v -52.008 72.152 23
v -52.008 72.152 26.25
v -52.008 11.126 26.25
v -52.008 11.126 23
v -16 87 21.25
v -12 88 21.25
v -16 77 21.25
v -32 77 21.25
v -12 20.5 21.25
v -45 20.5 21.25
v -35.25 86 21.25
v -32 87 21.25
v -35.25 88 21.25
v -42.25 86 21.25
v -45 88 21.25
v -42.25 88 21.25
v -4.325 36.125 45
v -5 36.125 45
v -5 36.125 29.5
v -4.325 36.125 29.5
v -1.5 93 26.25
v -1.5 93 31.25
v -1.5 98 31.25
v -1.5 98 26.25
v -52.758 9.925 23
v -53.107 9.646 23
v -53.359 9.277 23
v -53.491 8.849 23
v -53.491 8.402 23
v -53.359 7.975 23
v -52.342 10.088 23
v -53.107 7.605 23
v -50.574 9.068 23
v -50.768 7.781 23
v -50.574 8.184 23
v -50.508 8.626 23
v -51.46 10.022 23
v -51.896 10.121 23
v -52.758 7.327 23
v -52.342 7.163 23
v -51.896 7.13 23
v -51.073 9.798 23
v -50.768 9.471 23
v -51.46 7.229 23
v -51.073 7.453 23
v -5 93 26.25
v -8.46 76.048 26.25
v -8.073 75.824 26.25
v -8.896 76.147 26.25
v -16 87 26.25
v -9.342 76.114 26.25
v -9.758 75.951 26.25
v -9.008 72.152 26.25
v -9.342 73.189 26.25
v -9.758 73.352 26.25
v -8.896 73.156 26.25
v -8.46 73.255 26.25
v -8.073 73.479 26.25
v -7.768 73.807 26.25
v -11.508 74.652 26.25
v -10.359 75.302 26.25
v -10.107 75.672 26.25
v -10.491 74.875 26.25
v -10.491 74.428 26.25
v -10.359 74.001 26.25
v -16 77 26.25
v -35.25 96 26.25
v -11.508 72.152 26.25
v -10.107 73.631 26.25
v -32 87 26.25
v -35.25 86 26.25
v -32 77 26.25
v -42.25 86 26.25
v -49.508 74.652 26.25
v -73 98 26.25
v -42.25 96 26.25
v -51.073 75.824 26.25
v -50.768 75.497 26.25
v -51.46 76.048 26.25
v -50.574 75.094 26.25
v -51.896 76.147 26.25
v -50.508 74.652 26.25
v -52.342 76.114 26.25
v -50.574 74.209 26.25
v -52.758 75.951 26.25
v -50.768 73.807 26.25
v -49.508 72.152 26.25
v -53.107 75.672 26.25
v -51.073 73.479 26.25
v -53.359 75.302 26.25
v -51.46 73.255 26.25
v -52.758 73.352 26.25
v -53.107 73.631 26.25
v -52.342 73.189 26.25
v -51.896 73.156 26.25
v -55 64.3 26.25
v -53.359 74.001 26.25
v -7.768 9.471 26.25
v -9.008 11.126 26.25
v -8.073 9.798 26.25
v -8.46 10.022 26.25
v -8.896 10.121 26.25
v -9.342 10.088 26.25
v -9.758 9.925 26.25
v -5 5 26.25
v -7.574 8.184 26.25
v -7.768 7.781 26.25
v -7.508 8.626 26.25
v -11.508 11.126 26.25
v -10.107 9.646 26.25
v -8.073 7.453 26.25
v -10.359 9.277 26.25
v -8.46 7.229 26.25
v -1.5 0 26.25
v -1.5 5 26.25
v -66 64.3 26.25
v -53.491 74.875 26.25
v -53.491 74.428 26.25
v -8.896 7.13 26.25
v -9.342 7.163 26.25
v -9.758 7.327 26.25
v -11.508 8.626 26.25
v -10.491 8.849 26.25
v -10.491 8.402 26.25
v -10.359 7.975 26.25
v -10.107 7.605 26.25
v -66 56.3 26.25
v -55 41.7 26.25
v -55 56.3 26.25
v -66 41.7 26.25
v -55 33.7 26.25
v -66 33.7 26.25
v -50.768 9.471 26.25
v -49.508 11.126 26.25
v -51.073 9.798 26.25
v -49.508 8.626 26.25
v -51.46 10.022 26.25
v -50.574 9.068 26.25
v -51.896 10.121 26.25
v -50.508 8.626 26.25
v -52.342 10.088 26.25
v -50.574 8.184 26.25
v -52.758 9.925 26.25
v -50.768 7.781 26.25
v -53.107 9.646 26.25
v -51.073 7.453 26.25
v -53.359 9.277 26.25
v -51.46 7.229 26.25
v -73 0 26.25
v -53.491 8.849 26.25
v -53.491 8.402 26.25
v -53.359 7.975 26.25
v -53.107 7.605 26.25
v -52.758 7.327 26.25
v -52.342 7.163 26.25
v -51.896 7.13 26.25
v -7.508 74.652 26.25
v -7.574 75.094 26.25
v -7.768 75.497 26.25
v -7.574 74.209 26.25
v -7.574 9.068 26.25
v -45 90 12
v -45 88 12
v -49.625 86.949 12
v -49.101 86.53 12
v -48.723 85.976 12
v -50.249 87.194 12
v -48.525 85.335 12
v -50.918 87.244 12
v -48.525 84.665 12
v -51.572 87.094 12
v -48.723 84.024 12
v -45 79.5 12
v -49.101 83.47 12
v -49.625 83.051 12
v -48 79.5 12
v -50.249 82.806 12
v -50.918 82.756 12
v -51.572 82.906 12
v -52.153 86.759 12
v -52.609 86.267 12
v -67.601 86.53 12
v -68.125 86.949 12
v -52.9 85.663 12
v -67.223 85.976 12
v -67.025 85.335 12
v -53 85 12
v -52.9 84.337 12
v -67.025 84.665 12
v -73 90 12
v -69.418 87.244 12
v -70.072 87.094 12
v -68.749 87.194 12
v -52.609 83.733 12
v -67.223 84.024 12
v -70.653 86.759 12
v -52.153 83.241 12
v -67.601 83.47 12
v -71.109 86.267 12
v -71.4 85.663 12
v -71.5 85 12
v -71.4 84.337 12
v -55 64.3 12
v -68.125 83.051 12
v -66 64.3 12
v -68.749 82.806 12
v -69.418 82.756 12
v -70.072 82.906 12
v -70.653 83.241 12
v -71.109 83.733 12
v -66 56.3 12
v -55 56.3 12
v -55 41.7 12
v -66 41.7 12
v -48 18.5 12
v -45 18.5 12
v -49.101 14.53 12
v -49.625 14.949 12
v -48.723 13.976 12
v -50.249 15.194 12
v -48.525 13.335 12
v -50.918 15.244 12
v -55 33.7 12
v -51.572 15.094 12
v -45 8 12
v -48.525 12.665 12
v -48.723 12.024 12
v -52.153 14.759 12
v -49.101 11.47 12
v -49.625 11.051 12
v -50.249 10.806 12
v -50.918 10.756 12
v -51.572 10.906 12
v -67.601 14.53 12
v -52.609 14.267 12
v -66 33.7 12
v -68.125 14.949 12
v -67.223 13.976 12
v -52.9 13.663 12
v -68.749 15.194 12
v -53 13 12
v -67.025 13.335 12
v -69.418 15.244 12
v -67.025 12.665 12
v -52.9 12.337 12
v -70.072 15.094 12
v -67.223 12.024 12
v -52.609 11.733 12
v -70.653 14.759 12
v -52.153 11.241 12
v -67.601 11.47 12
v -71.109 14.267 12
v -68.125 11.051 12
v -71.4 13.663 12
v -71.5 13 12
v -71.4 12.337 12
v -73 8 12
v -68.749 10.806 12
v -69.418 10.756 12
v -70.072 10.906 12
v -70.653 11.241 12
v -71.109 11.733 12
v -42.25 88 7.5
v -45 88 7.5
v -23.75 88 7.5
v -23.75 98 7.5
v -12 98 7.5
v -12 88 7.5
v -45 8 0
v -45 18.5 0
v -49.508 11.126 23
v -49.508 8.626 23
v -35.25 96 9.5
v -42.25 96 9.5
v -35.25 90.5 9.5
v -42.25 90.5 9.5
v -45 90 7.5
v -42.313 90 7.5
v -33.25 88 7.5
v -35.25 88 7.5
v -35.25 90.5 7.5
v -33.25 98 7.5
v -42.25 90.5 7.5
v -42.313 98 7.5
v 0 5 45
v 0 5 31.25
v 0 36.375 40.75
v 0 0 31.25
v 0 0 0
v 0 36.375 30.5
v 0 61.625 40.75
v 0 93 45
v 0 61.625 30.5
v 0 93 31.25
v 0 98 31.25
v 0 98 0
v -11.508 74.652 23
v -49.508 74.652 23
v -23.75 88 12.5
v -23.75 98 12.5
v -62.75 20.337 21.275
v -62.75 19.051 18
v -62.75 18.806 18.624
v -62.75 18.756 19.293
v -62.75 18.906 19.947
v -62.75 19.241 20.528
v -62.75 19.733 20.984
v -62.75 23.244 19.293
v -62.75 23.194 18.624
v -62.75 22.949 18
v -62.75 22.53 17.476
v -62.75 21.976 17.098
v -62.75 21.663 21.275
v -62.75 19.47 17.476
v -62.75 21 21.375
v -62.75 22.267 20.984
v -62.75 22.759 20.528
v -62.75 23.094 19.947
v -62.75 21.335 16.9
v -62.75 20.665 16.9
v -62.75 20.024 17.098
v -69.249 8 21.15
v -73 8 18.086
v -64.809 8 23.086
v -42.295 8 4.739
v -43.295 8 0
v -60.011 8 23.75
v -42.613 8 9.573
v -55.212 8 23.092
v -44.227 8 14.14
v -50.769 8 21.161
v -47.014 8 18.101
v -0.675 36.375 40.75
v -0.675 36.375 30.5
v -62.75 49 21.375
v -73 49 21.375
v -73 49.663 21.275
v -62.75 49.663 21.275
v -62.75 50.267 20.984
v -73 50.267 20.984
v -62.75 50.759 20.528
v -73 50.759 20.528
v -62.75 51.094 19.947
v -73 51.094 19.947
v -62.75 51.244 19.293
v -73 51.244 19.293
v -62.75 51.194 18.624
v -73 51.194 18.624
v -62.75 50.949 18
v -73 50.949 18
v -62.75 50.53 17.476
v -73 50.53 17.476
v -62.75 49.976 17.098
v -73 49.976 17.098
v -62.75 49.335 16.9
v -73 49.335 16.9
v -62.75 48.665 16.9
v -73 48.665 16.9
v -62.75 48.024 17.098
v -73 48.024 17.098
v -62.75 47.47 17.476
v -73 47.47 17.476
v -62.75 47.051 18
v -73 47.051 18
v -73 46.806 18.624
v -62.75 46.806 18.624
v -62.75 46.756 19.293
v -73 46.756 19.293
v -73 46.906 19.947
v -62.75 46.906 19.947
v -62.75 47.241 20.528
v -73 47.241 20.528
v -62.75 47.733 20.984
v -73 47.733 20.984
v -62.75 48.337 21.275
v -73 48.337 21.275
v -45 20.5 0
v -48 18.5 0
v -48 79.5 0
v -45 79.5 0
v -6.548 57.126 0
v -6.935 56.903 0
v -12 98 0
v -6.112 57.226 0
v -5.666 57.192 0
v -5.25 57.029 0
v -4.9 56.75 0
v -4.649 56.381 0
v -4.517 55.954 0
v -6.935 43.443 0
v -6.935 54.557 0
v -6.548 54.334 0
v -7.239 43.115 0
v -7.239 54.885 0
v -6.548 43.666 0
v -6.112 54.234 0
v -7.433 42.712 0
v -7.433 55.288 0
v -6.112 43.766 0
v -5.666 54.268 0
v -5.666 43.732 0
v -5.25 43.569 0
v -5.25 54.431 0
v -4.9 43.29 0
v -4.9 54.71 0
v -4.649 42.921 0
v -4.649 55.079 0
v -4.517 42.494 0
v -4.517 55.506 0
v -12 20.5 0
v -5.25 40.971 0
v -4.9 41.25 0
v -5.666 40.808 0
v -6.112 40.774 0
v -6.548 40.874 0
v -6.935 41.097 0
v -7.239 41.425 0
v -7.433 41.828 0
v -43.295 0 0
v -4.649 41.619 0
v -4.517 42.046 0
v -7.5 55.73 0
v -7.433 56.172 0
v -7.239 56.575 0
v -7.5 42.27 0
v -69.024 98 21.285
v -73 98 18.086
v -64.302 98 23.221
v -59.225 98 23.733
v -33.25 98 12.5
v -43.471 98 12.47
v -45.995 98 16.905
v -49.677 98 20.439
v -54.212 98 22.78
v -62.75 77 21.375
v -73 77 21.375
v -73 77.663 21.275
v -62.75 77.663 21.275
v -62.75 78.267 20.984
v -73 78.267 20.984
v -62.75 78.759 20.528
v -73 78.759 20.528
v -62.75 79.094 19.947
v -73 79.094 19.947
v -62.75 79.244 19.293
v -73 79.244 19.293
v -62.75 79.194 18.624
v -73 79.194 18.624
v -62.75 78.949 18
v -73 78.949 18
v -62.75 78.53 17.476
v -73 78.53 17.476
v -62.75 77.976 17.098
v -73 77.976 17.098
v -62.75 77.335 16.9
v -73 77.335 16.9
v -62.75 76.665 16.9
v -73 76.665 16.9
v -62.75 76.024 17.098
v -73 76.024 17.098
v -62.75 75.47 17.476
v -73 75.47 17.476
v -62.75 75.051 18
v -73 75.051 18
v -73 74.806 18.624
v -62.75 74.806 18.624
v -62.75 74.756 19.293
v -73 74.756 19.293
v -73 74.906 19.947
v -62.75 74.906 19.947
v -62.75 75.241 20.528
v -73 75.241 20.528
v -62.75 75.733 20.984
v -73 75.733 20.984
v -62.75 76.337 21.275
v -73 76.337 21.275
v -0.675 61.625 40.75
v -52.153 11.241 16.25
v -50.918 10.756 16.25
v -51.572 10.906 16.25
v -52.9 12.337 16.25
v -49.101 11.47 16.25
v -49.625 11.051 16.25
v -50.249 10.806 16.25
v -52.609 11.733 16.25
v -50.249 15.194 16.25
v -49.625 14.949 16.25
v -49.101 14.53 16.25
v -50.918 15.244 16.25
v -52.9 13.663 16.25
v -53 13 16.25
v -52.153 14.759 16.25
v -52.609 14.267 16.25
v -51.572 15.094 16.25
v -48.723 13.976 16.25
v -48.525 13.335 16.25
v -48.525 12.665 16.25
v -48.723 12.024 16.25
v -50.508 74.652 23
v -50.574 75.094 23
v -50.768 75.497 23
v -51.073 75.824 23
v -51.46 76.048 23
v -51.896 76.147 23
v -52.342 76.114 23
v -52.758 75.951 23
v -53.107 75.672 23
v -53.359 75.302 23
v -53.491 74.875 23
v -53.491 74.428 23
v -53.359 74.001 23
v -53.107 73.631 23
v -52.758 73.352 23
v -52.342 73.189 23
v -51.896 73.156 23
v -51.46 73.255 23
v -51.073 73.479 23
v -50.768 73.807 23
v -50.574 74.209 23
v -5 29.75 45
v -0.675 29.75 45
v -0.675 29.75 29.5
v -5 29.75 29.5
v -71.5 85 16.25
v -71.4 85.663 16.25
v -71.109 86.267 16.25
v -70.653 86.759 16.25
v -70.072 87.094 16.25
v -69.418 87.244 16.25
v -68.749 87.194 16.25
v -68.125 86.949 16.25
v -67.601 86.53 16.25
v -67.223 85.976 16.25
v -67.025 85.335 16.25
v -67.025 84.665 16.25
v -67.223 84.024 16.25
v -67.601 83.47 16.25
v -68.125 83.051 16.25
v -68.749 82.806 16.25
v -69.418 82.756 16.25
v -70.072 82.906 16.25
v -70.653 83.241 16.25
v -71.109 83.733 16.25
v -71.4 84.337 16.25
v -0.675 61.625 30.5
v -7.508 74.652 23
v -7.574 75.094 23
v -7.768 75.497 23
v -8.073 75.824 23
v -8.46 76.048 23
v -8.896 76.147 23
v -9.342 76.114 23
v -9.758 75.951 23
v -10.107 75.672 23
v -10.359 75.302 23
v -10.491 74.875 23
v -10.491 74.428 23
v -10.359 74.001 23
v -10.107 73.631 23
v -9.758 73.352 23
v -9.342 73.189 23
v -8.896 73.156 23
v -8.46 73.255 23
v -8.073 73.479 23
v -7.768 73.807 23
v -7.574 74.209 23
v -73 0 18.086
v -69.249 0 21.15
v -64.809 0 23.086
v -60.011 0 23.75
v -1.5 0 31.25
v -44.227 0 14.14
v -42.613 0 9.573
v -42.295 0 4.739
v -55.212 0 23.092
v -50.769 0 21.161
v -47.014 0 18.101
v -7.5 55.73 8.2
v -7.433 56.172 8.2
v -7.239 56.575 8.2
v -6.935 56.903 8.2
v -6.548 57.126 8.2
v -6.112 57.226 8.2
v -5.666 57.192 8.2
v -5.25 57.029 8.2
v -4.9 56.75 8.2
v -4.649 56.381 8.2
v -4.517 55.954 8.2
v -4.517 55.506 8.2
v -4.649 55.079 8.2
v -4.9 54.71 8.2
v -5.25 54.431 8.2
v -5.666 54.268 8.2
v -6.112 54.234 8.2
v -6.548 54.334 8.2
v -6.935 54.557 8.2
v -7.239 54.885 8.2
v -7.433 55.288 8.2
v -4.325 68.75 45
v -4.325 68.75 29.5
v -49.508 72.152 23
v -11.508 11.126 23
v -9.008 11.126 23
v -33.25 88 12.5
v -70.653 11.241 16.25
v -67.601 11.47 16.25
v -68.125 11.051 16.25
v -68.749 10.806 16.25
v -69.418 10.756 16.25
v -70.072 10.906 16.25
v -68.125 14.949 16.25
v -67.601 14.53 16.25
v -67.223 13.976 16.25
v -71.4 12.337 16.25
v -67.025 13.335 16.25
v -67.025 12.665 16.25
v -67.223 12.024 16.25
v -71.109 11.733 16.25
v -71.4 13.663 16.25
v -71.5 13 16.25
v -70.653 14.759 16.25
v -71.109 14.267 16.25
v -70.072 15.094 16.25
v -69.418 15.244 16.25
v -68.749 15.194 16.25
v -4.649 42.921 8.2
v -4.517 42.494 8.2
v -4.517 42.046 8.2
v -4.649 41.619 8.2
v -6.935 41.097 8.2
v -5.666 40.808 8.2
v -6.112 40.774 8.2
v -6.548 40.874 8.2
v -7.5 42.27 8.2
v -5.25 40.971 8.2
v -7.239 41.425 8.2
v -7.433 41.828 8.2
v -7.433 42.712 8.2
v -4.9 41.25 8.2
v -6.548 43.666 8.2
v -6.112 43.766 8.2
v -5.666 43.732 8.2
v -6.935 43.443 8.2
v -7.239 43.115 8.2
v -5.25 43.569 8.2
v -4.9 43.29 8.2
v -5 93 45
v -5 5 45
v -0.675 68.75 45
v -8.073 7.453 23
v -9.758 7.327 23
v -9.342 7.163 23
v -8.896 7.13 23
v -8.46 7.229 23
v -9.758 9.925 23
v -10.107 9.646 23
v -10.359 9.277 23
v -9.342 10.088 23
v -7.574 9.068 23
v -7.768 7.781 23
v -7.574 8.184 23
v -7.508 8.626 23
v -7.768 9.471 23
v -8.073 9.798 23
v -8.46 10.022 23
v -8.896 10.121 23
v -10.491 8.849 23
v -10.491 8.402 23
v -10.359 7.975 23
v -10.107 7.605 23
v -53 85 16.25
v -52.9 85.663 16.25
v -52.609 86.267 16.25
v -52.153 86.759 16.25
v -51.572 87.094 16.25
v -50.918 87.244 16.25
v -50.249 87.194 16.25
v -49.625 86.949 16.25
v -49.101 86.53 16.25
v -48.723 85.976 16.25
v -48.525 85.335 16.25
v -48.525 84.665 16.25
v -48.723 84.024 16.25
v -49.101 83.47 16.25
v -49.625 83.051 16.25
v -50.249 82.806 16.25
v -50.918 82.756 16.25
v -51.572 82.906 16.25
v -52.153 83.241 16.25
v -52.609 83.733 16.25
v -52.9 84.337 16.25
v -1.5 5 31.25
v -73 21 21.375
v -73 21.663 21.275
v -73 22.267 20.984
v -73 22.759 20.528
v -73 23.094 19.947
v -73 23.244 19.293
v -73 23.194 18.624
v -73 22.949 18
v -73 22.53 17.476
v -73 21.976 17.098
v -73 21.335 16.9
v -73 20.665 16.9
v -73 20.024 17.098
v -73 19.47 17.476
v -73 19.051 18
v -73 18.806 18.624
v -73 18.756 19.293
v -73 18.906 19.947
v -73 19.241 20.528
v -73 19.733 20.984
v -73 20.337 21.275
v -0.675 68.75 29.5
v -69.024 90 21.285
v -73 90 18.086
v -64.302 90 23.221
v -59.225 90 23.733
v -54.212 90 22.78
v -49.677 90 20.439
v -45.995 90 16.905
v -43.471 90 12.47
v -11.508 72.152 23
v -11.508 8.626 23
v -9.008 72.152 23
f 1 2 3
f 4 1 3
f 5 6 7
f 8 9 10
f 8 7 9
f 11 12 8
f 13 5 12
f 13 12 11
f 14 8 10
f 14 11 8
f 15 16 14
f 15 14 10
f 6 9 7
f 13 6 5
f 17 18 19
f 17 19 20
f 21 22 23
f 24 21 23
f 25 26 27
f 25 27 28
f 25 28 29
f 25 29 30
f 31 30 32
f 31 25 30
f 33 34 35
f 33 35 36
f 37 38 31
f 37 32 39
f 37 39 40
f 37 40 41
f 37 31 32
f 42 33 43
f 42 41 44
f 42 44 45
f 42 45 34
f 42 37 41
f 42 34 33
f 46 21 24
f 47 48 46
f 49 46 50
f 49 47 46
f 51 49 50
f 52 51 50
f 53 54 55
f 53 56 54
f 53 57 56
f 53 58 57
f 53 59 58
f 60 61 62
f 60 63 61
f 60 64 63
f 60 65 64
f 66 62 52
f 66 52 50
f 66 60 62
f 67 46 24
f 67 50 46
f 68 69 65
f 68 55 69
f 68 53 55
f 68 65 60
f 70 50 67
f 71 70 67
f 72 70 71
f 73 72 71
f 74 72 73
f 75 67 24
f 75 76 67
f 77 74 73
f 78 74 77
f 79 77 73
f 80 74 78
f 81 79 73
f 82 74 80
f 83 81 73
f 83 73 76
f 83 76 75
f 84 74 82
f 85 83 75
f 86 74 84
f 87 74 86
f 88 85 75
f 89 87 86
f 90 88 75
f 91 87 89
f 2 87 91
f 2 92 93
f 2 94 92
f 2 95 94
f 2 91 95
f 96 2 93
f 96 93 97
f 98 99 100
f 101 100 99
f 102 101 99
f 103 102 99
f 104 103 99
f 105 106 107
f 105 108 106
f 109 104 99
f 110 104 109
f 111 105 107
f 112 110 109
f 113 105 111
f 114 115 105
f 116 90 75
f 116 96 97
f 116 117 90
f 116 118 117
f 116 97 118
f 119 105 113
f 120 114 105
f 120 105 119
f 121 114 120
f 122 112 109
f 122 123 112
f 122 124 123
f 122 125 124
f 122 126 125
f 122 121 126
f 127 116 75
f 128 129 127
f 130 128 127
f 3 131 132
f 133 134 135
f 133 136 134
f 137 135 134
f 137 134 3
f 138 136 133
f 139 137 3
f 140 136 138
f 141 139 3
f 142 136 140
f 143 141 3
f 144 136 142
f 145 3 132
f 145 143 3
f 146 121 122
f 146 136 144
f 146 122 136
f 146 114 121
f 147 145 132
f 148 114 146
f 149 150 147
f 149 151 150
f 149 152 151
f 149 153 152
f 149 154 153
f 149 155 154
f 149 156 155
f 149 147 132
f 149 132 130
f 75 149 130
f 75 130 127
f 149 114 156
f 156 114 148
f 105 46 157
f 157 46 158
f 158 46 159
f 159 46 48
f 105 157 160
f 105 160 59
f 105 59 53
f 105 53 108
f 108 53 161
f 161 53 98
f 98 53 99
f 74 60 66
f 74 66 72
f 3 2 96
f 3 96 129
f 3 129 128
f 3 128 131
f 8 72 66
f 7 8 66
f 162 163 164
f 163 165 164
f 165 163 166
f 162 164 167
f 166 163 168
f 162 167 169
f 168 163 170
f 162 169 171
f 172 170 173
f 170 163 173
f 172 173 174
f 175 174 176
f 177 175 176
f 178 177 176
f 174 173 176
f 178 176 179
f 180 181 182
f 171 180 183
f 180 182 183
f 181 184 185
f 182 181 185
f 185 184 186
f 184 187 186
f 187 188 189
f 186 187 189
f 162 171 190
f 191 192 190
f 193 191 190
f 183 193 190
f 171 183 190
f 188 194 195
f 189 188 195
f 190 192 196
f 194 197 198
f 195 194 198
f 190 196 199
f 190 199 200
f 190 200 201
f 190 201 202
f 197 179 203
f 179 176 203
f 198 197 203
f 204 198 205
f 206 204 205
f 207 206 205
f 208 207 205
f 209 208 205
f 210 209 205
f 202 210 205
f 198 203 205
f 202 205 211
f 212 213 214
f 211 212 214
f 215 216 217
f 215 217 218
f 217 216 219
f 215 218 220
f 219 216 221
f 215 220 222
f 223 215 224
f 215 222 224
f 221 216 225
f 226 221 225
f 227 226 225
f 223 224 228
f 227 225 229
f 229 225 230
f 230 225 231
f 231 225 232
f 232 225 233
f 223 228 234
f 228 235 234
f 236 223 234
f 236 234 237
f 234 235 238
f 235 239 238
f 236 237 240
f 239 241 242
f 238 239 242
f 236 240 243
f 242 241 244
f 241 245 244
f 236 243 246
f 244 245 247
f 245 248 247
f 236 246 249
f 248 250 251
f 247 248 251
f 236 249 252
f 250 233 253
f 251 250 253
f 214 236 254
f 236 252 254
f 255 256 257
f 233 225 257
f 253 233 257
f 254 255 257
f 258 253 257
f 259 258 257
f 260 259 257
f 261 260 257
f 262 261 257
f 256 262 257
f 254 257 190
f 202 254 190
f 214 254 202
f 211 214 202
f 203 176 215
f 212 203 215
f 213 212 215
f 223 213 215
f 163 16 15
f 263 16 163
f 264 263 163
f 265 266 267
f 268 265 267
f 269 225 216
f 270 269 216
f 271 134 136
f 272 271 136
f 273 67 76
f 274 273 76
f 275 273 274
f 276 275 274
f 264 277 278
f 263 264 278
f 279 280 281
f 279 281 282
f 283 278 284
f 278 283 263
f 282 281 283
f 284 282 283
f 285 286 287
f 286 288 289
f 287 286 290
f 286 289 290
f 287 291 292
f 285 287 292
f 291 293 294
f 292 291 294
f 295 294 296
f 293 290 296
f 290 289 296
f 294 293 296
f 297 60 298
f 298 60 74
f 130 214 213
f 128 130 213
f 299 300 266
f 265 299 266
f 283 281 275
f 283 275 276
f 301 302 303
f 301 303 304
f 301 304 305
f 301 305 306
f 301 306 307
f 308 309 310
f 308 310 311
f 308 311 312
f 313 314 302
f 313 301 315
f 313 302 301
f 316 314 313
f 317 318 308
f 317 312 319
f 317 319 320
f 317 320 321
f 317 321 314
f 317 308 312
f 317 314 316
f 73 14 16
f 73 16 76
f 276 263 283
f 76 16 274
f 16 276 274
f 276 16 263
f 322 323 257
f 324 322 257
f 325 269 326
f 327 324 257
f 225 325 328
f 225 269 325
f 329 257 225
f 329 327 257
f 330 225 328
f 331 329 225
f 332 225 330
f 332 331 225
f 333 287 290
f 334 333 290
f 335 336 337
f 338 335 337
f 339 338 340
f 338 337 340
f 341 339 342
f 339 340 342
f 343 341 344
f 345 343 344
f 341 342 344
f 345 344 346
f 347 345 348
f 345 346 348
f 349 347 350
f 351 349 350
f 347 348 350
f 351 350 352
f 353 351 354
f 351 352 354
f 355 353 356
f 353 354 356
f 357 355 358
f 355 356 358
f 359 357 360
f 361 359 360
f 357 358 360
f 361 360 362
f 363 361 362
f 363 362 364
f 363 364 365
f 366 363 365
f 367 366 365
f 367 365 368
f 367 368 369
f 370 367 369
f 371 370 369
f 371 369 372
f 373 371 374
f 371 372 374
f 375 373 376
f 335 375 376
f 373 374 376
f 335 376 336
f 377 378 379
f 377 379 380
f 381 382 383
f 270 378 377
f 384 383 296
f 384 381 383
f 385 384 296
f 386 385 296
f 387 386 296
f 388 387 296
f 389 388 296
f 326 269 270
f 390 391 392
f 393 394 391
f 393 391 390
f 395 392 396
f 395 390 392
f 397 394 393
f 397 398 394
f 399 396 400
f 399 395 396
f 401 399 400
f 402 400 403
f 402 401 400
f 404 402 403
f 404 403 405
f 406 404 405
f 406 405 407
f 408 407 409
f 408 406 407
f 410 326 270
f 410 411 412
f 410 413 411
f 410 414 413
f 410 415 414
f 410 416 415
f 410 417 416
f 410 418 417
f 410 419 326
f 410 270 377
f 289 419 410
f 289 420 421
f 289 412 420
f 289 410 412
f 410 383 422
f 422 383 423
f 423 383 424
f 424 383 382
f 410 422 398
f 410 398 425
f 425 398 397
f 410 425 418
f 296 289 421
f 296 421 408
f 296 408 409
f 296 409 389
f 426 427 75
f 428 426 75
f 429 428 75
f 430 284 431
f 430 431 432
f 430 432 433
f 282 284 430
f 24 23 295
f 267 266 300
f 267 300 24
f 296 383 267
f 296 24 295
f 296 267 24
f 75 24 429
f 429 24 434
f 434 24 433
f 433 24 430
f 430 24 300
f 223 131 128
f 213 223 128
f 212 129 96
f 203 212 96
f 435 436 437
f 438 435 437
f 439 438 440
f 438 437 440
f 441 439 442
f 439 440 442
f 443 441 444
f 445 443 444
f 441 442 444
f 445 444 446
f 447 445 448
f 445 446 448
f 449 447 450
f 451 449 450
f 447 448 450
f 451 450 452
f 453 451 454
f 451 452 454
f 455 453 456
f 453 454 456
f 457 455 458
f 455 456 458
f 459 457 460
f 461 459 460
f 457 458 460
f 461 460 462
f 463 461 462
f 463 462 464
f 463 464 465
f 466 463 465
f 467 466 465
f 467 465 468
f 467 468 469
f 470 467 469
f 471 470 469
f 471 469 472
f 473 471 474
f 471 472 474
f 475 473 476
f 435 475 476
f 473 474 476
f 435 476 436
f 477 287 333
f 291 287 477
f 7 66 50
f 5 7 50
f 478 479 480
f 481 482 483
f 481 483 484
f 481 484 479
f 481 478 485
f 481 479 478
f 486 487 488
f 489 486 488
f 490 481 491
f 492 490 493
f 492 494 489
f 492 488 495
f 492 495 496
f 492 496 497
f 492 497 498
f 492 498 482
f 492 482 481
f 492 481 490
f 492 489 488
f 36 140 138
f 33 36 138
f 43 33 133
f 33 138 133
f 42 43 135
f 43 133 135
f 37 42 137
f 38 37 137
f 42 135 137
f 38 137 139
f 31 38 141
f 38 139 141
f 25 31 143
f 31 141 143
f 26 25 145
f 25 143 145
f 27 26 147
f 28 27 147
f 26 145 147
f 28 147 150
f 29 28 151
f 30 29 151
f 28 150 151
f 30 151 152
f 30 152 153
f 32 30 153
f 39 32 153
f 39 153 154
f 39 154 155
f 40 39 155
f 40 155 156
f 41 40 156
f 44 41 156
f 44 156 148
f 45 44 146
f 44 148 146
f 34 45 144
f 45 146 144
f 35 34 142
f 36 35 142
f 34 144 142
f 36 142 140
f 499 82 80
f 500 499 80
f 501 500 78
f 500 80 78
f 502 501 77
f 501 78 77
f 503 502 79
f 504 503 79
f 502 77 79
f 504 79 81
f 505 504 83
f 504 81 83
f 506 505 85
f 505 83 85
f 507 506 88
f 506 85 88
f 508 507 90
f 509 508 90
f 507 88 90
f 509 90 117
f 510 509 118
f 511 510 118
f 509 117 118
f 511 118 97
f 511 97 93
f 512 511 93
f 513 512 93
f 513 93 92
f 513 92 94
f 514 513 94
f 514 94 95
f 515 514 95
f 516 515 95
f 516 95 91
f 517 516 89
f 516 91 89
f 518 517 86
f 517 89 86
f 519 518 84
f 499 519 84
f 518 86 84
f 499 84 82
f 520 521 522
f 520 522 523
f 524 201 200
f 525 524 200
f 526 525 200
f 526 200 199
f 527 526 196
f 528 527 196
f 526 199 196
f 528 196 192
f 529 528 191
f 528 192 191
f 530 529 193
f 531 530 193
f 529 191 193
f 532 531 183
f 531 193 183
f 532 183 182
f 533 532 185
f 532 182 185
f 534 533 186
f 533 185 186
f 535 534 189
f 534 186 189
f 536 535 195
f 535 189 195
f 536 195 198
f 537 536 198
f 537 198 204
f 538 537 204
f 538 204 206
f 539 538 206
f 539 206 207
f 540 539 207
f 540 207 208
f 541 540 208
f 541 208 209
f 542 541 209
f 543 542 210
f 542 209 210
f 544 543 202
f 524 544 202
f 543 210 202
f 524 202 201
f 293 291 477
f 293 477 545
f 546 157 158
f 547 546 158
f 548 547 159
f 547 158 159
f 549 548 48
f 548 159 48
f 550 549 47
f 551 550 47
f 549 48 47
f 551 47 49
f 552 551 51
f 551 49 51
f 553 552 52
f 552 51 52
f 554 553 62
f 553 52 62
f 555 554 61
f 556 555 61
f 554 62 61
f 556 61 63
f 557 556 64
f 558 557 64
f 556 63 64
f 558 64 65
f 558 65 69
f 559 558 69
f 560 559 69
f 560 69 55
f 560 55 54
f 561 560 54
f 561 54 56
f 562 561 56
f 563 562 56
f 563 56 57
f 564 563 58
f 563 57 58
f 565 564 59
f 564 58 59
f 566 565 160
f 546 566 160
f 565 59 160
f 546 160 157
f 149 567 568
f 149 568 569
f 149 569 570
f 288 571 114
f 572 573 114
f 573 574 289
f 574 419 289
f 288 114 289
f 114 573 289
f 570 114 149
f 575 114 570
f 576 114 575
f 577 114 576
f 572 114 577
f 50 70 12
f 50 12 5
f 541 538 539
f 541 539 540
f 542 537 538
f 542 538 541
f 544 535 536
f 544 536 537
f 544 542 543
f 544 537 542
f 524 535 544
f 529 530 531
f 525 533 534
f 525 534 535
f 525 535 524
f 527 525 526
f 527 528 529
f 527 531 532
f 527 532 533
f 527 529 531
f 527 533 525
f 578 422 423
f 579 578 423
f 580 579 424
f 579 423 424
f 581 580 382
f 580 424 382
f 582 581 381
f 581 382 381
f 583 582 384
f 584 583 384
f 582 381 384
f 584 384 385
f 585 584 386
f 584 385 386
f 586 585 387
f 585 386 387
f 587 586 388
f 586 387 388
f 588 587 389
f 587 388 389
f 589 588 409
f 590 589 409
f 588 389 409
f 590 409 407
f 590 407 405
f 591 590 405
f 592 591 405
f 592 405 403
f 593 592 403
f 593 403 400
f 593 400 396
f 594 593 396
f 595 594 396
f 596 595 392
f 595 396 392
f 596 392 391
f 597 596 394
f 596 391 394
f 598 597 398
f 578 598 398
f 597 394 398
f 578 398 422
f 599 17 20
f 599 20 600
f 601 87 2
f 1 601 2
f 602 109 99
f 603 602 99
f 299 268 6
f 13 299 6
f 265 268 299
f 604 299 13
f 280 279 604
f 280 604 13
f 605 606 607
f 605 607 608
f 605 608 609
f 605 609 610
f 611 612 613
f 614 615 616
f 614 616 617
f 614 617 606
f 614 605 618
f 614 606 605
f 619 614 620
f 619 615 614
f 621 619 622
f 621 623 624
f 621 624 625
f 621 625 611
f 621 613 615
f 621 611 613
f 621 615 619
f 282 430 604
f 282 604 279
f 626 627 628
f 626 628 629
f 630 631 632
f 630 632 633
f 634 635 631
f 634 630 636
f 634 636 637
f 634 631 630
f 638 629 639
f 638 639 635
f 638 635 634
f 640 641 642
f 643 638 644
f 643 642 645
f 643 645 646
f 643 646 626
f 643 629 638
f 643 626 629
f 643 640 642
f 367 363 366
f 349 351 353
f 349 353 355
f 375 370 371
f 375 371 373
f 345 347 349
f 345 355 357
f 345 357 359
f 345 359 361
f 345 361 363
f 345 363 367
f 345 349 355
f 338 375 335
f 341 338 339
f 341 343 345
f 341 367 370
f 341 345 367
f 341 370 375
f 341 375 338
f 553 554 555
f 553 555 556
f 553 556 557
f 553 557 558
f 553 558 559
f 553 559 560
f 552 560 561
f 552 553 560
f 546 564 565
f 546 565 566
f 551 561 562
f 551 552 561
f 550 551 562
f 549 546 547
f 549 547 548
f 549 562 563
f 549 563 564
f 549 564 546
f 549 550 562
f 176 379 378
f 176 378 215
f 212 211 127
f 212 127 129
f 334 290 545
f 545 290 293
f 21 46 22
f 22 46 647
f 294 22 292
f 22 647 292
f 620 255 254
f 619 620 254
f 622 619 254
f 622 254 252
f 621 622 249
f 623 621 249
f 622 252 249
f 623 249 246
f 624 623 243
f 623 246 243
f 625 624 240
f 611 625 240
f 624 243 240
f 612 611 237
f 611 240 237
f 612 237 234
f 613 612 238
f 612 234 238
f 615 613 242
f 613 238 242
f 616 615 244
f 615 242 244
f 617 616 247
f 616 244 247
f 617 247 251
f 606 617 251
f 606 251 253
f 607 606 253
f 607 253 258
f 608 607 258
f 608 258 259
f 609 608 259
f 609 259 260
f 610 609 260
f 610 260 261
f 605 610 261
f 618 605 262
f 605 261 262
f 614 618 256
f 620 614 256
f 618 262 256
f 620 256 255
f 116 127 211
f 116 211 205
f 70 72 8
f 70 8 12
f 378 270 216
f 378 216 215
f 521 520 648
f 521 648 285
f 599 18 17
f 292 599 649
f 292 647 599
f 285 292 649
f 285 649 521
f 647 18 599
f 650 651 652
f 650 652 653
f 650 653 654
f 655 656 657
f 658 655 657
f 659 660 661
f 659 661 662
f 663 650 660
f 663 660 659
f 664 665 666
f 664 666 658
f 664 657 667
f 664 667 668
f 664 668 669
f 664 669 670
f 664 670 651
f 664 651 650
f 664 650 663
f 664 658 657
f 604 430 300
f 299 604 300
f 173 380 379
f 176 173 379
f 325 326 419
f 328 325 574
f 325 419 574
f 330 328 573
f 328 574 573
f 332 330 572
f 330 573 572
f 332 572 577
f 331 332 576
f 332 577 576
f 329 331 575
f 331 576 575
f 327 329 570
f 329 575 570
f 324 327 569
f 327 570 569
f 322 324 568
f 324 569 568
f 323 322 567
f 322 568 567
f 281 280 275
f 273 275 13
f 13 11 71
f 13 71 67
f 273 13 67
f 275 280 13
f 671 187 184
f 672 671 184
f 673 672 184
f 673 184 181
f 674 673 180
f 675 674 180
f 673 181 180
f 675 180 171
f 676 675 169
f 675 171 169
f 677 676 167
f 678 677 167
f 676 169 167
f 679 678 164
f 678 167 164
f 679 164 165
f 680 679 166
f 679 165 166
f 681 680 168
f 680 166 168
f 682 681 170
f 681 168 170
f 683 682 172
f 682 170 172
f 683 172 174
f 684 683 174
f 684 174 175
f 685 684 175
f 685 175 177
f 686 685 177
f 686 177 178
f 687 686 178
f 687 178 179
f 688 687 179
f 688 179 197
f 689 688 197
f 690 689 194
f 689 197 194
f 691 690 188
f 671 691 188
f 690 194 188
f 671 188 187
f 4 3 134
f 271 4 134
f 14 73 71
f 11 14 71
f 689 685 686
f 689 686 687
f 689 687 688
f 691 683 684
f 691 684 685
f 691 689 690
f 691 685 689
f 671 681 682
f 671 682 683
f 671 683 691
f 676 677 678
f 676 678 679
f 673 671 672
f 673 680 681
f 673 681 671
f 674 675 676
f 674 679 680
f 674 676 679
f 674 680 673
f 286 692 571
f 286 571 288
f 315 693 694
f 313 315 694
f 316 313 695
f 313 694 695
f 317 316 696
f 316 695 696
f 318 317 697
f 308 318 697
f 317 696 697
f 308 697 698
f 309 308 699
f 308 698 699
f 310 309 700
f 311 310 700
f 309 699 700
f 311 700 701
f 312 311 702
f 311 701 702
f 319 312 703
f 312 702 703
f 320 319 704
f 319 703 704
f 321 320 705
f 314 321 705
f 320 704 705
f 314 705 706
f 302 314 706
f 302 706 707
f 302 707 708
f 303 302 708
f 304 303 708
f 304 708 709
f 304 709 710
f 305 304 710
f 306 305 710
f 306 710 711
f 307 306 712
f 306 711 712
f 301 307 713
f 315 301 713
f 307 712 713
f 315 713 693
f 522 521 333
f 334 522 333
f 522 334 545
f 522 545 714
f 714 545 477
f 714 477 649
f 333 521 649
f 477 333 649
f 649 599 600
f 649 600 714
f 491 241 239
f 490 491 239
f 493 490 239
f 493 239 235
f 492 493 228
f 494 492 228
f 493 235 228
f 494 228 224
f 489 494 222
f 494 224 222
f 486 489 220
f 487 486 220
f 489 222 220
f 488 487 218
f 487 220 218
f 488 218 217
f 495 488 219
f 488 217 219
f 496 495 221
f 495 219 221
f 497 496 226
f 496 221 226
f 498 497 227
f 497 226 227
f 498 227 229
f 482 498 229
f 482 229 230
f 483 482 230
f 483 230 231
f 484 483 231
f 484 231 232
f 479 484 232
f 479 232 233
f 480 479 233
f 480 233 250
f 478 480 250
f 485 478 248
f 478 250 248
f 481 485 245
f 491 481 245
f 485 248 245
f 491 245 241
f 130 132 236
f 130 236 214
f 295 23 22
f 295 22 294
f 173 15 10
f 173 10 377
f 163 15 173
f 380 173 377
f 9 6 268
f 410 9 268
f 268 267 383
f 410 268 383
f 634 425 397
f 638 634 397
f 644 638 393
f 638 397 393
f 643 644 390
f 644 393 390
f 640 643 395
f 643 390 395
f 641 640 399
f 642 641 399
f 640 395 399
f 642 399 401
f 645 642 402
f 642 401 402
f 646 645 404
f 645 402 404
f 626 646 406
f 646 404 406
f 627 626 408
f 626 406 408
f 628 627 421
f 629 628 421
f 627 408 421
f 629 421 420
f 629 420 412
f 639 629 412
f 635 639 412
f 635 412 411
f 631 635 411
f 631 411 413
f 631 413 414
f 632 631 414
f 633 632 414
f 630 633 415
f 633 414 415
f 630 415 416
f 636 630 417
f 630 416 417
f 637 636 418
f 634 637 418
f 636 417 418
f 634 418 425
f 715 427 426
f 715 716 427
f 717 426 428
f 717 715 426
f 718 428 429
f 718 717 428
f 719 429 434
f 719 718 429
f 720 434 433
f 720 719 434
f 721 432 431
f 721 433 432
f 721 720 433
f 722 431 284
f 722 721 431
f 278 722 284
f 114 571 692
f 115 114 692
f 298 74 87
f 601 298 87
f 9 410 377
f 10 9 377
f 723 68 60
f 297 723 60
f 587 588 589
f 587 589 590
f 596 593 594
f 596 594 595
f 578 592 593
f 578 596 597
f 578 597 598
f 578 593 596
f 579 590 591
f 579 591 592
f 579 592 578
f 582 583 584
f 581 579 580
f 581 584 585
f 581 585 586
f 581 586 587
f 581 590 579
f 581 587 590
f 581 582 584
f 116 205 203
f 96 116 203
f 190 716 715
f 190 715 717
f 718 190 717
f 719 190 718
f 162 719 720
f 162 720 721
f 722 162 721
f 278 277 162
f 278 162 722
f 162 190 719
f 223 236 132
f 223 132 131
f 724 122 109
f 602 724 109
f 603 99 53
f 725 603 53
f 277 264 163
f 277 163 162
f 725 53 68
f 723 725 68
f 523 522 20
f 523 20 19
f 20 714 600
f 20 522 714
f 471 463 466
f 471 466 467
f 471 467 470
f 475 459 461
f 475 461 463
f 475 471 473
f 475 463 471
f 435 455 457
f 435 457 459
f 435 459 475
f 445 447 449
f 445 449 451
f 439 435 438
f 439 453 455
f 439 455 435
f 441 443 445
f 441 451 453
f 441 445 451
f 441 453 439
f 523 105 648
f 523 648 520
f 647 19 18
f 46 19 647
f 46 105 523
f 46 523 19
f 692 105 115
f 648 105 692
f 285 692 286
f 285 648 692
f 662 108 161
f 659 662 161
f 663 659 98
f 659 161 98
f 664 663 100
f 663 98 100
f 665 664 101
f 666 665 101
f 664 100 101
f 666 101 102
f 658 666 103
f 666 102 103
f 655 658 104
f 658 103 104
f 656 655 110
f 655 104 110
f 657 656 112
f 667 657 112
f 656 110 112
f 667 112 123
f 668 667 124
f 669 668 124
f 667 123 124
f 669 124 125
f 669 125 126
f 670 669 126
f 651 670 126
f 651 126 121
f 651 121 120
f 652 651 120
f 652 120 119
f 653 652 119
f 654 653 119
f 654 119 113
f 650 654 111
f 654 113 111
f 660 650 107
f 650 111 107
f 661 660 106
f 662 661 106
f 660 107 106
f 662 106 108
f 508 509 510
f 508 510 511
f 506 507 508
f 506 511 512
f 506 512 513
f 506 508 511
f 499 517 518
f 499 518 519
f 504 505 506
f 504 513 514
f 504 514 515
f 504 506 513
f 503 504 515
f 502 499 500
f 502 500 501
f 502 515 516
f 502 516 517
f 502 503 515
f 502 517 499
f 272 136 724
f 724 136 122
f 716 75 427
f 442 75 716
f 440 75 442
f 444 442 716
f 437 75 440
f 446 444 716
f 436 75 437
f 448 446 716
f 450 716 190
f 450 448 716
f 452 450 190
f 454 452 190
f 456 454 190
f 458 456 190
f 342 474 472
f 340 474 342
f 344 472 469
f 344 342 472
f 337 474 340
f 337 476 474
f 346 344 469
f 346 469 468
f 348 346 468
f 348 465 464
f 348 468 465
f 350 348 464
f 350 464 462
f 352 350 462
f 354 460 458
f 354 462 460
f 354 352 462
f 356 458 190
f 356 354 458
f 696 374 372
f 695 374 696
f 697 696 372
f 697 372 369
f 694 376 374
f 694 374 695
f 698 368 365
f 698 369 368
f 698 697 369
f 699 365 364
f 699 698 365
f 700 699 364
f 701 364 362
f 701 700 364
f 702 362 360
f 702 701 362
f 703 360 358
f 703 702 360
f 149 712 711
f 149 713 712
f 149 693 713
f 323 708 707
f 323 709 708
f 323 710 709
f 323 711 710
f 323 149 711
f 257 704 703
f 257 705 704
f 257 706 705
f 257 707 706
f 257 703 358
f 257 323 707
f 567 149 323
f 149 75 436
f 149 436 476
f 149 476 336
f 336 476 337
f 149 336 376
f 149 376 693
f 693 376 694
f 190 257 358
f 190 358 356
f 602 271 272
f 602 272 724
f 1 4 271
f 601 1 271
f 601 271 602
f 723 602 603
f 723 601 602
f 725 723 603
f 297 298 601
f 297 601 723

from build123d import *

# Parameters (mm, degrees)
SKETCH1_W           = 72
SKETCH1_H           = 26.25
BOSS_EXTRUDE1_DEPTH = 98
SKETCH3_W           = 24
SKETCH3_H           = 12
CUT_EXTRUDE2_DEPTH  = 98
SKETCH4_W           = 1
SKETCH4_H           = 14.25
BOSS_EXTRUDE2_DEPTH = 98
SKETCH8_R           = 17.75
CUT_EXTRUDE6_DEPTH  = 8
CUT_EXTRUDE7_START  = -8
SKETCH9_R           = 17.75
CUT_EXTRUDE7_DEPTH  = 8
SKETCH10_R          = 2.25
CUT_EXTRUDE8_DEPTH  = 4.25
SKETCH11_W          = 33
SKETCH11_H          = 67.5
CUT_EXTRUDE9_DEPTH  = 21.25
SKETCH12_W          = 33
SKETCH12_H          = 7.5
CUT_EXTRUDE10_DEPTH = 21.25
SKETCH13_W          = 9.5
SKETCH13_H          = 10
CUT_EXTRUDE11_DEPTH = 21.25
SKETCH14_W          = 5
SKETCH14_H          = 5
CUT_EXTRUDE13_DEPTH = 101.25
SKETCH17_W          = 7
SKETCH17_H          = 8
CUT_EXTRUDE14_DEPTH = 7
SKETCH18_W          = 5.398243629
SKETCH18_H          = 5.439982626
BOSS_EXTRUDE3_DEPTH = 2
SKETCH19_W          = 16
SKETCH19_H          = 10
CUT_EXTRUDE15_DEPTH = 12
SKETCH22_R          = 1.5
CUT_EXTRUDE16_DEPTH = 8.2
SKETCH23_W          = 11
SKETCH23_H          = 8
CUT_EXTRUDE18_DEPTH = 125.988249448
SKETCH25_R          = 2.25
CUT_EXTRUDE20_DEPTH = 10.25
SKETCH26_W          = 7
SKETCH26_H          = 8
CUT_EXTRUDE21_DEPTH = 124.057913195
SKETCH28_W          = 7.2
SKETCH28_H          = 8.135980894
BOSS_EXTRUDE6_DEPTH = 2
SKETCH31_R          = 1.5
CUT_EXTRUDE24_DEPTH = 3.25
SKETCH32_W          = 5
SKETCH32_H          = 98
BOSS_EXTRUDE7_DEPTH = 18.75
SKETCH34_W          = 5
SKETCH34_H          = 5
CUT_EXTRUDE27_DEPTH = 13.75
SKETCH35_W          = 3.5
SKETCH35_H          = 5
CUT_EXTRUDE28_DEPTH = 5
SKETCH37_W          = 10.25
SKETCH37_H          = 25.25
CUT_EXTRUDE29_DEPTH = 3
SKETCH36_W          = 3.65
SKETCH36_H          = 39
CUT_EXTRUDE30_DEPTH = 15.5
CUT_EXTRUDE31_DEPTH = 15.5
CUT_EXTRUDE32_DEPTH = 3.25
SKETCH41_W          = 7
SKETCH41_H          = 2.5
CUT_EXTRUDE33_DEPTH = 3
SKETCH42_W          = 7
SKETCH42_H          = 2
CUT_EXTRUDE34_DEPTH = 6
SKETCH43_W          = 3
SKETCH43_H          = 10.5
CUT_EXTRUDE35_DEPTH = 12


with BuildPart() as part:
    # Sketch1 → Boss-Extrude1 (new body)
    with BuildSketch(Plane(origin=(0, 0, 0), x_dir=(1, 0, 0), z_dir=(0, 1, 0))):
        with Locations((-36, -13.125)):
            Rectangle(SKETCH1_W, SKETCH1_H)
    extrude(amount=BOSS_EXTRUDE1_DEPTH)

    # Sketch3 → Cut-Extrude2 (cut)
    with BuildSketch(Plane.XZ):
        with Locations((-60, 6)):
            Rectangle(SKETCH3_W, SKETCH3_H)
    extrude(amount=-CUT_EXTRUDE2_DEPTH, mode=Mode.SUBTRACT)

    # Sketch4 → Boss-Extrude2 (add)
    with BuildSketch(Plane(origin=(0, 0, 0), x_dir=(-1, 0, 0), z_dir=(0, -1, 0))):
        with Locations((72.5, -19.125)):
            Rectangle(SKETCH4_W, SKETCH4_H)
    extrude(amount=-BOSS_EXTRUDE2_DEPTH)

    # Sketch8 → Cut-Extrude6 (cut)
    with BuildSketch(Plane.XZ):
        with Locations((-60, 6)):
            Circle(SKETCH8_R)
    extrude(amount=-CUT_EXTRUDE6_DEPTH, mode=Mode.SUBTRACT)

    # Sketch9 → Cut-Extrude7 (cut)
    with BuildSketch(Plane(origin=(0, 98, 0), x_dir=(1, 0, 0), z_dir=(0, 1, 0)).offset(CUT_EXTRUDE7_START)):
        with Locations((-60, -6)):
            Circle(SKETCH9_R)
    extrude(amount=CUT_EXTRUDE7_DEPTH, mode=Mode.SUBTRACT)

    # Sketch10 → Cut-Extrude8 (cut)
    with BuildSketch(Plane(origin=(0, 0, 12), x_dir=(-1, 0, 0), z_dir=(0, 0, -1))):
        with Locations((69.25, 85)):
            Circle(SKETCH10_R)
        with Locations((50.75, 85)):
            Circle(SKETCH10_R)
        with Locations((69.25, 13)):
            Circle(SKETCH10_R)
        with Locations((50.75, 13)):
            Circle(SKETCH10_R)
    extrude(amount=-CUT_EXTRUDE8_DEPTH, mode=Mode.SUBTRACT)

    # Sketch11 → Cut-Extrude9 (cut)
    with BuildSketch(Plane(origin=(0, 0, 0), x_dir=(-1, 0, 0), z_dir=(0, 0, -1))):
        with Locations((28.5, 54.25)):
            Rectangle(SKETCH11_W, SKETCH11_H)
    extrude(amount=-CUT_EXTRUDE9_DEPTH, mode=Mode.SUBTRACT)

    # Sketch12 → Cut-Extrude10 (cut)
    with BuildSketch(Plane(origin=(0, 98, 0), x_dir=(1, 0, 0), z_dir=(0, 1, 0))):
        with Locations((-28.5, -3.75)):
            Rectangle(SKETCH12_W, SKETCH12_H)
    extrude(amount=-CUT_EXTRUDE10_DEPTH, mode=Mode.SUBTRACT)

    # Sketch13 → Cut-Extrude11 (cut)
    with BuildSketch(Plane(origin=(0, 98, 0), x_dir=(1, 0, 0), z_dir=(0, 1, 0))):
        with Locations((-28.5, -7.5)):
            Rectangle(SKETCH13_W, SKETCH13_H)
    extrude(amount=-CUT_EXTRUDE11_DEPTH, mode=Mode.SUBTRACT)

    # Sketch14 → Cut-Extrude13 (cut)
    with BuildSketch(Plane(origin=(0, 20.5, 0), x_dir=(1, 0, 0), z_dir=(0, 1, 0))):
        with Locations((-39.5, -12)):
            Rectangle(SKETCH14_W, SKETCH14_H)
    extrude(amount=CUT_EXTRUDE13_DEPTH, mode=Mode.SUBTRACT)

    # Sketch17 → Cut-Extrude14 (cut)
    with BuildSketch(Plane(origin=(0, 0, 7.5), x_dir=(-1, 0, 0), z_dir=(0, 0, -1))):
        with Locations((38.75, 92)):
            Rectangle(SKETCH17_W, SKETCH17_H)
    extrude(amount=-CUT_EXTRUDE14_DEPTH, mode=Mode.SUBTRACT)

    # Sketch18 → Boss-Extrude3 (add)
    with BuildSketch(Plane(origin=(0, 98, 0), x_dir=(1, 0, 0), z_dir=(0, 1, 0))):
        with Locations((-39.480706385, -11.994977786)):
            Rectangle(SKETCH18_W, SKETCH18_H)
    extrude(amount=-BOSS_EXTRUDE3_DEPTH)

    # Sketch19 → Cut-Extrude15 (cut)
    with BuildSketch(Plane.XY.offset(26.25)):
        with Locations((-24, 82)):
            Rectangle(SKETCH19_W, SKETCH19_H)
    extrude(amount=-CUT_EXTRUDE15_DEPTH, mode=Mode.SUBTRACT)

    # Sketch22 → Cut-Extrude16 (cut)
    with BuildSketch(Plane(origin=(0, 0, 0), x_dir=(-1, 0, 0), z_dir=(0, 0, -1))):
        with Locations((6, 55.73)):
            Circle(SKETCH22_R)
        with Locations((6, 42.27)):
            Circle(SKETCH22_R)
    extrude(amount=-CUT_EXTRUDE16_DEPTH, mode=Mode.SUBTRACT)

    # Sketch23 → Cut-Extrude18 (cut, through all)
    with BuildSketch(Plane.XY.offset(26.25)):
        with Locations((-60.5, 37.7)):
            Rectangle(SKETCH23_W, SKETCH23_H)
        with Locations((-60.5, 60.3)):
            Rectangle(SKETCH23_W, SKETCH23_H)
    extrude(amount=-CUT_EXTRUDE18_DEPTH, mode=Mode.SUBTRACT)

    # Sketch25 → Cut-Extrude20 (cut)
    with BuildSketch(Plane.ZY.offset(73)):
        with Locations((19.125, 77)):
            Circle(SKETCH25_R)
        with Locations((19.125, 49)):
            Circle(SKETCH25_R)
        with Locations((19.125, 21)):
            Circle(SKETCH25_R)
    extrude(amount=-CUT_EXTRUDE20_DEPTH, mode=Mode.SUBTRACT)

    # Sketch26 → Cut-Extrude21 (cut, through all)
    with BuildSketch(Plane(origin=(0, 0, 14.5), x_dir=(-1, 0, 0), z_dir=(0, 0, -1))):
        with Locations((38.75, 92)):
            Rectangle(SKETCH26_W, SKETCH26_H)
    extrude(amount=-CUT_EXTRUDE21_DEPTH, mode=Mode.SUBTRACT)

    # Sketch28 → Boss-Extrude6 (add)
    with BuildSketch(Plane(origin=(0, 0, 7.5), x_dir=(-1, 0, 0), z_dir=(0, 0, -1))):
        with Locations((38.666345703, 92.067990447)):
            Rectangle(SKETCH28_W, SKETCH28_H)
    extrude(amount=-BOSS_EXTRUDE6_DEPTH)

    # Sketch31 → Cut-Extrude24 (cut)
    with BuildSketch(Plane.XY.offset(26.25)):
        with Locations((-52.007752906, 74.651528785)):
            Circle(SKETCH31_R)
        with Locations((-9.007752906, 74.651528785)):
            Circle(SKETCH31_R)
        with Locations((-9.007752906, 8.625682812)):
            Circle(SKETCH31_R)
        with Locations((-52.007752906, 8.625682812)):
            Circle(SKETCH31_R)
    extrude(amount=-CUT_EXTRUDE24_DEPTH, mode=Mode.SUBTRACT)

    # Sketch32 → Boss-Extrude7 (add)
    with BuildSketch(Plane.XY.offset(26.25)):
        with Locations((-2.5, 49)):
            Rectangle(SKETCH32_W, SKETCH32_H)
    extrude(amount=BOSS_EXTRUDE7_DEPTH)

    # Sketch34 → Cut-Extrude27 (cut)
    with BuildSketch(Plane.XY.offset(45)):
        with Locations((-2.5, 95.5)):
            Rectangle(SKETCH34_W, SKETCH34_H)
        with Locations((-2.5, 2.5)):
            Rectangle(SKETCH34_W, SKETCH34_H)
    extrude(amount=-CUT_EXTRUDE27_DEPTH, mode=Mode.SUBTRACT)

    # Sketch35 → Cut-Extrude28 (cut)
    with BuildSketch(Plane.XY.offset(31.25)):
        with Locations((-3.25, 95.5)):
            Rectangle(SKETCH35_W, SKETCH35_H)
        with Locations((-3.25, 2.5)):
            Rectangle(SKETCH35_W, SKETCH35_H)
    extrude(amount=-CUT_EXTRUDE28_DEPTH, mode=Mode.SUBTRACT)

    # Sketch37 → Cut-Extrude29 (cut)
    with BuildSketch(Plane(origin=(0, 0, 0), x_dir=(0, 0, -1), z_dir=(1, 0, 0))):
        with Locations((-35.625, 49)):
            Rectangle(SKETCH37_W, SKETCH37_H)
    extrude(amount=-CUT_EXTRUDE29_DEPTH, mode=Mode.SUBTRACT)

    # Sketch36 → Cut-Extrude30 (cut)
    with BuildSketch(Plane.XY.offset(45)):
        with Locations((-2.5, 49.25)):
            Rectangle(SKETCH36_W, SKETCH36_H)
    extrude(amount=-CUT_EXTRUDE30_DEPTH, mode=Mode.SUBTRACT)

    # Sketch38 → Cut-Extrude31 (cut)
    with BuildSketch(Plane.XY.offset(45)):
        Polygon((-4.325, 30.125), (-4.325, 29.75), (-5, 29.75), (-5.005, 30.125), (-5.005, 36.125), (-4.325, 36.125), align=None)
    extrude(amount=-CUT_EXTRUDE31_DEPTH, mode=Mode.SUBTRACT)

    # Sketch39 → Cut-Extrude32 (cut)
    with BuildSketch(Plane.XY.offset(26.25)):
        Polygon((-49.507752906, 72.151528785), (-52.007752906, 72.151528785), (-52.007752906, 11.125682812), (-49.507752906, 11.125682812), (-49.507752906, 8.625682812), (-11.507752906, 8.625682812), (-11.507752906, 11.125682812), (-9.007752906, 11.125682812), (-9.007752906, 72.151528785), (-11.507752906, 72.151528785), (-11.507752906, 74.651528785), (-49.507752906, 74.651528785), align=None)
    extrude(amount=-CUT_EXTRUDE32_DEPTH, mode=Mode.SUBTRACT)

    # Sketch41 → Cut-Extrude33 (cut)
    with BuildSketch(Plane(origin=(0, 0, 7.5), x_dir=(-1, 0, 0), z_dir=(0, 0, -1))):
        with Locations((38.75, 89.25)):
            Rectangle(SKETCH41_W, SKETCH41_H)
    extrude(amount=-CUT_EXTRUDE33_DEPTH, mode=Mode.SUBTRACT)

    # Sketch42 → Cut-Extrude34 (cut)
    with BuildSketch(Plane.XY.offset(26.25)):
        with Locations((-38.75, 87)):
            Rectangle(SKETCH42_W, SKETCH42_H)
    extrude(amount=-CUT_EXTRUDE34_DEPTH, mode=Mode.SUBTRACT)

    # Sketch43 → Cut-Extrude35 (cut)
    with BuildSketch(Plane(origin=(0, 0, 0), x_dir=(-1, 0, 0), z_dir=(0, 0, -1))):
        with Locations((46.5, 84.75)):
            Rectangle(SKETCH43_W, SKETCH43_H)
        with Locations((46.5, 13.25)):
            Rectangle(SKETCH43_W, SKETCH43_H)
    extrude(amount=-CUT_EXTRUDE35_DEPTH, mode=Mode.SUBTRACT)


solid = part.part
